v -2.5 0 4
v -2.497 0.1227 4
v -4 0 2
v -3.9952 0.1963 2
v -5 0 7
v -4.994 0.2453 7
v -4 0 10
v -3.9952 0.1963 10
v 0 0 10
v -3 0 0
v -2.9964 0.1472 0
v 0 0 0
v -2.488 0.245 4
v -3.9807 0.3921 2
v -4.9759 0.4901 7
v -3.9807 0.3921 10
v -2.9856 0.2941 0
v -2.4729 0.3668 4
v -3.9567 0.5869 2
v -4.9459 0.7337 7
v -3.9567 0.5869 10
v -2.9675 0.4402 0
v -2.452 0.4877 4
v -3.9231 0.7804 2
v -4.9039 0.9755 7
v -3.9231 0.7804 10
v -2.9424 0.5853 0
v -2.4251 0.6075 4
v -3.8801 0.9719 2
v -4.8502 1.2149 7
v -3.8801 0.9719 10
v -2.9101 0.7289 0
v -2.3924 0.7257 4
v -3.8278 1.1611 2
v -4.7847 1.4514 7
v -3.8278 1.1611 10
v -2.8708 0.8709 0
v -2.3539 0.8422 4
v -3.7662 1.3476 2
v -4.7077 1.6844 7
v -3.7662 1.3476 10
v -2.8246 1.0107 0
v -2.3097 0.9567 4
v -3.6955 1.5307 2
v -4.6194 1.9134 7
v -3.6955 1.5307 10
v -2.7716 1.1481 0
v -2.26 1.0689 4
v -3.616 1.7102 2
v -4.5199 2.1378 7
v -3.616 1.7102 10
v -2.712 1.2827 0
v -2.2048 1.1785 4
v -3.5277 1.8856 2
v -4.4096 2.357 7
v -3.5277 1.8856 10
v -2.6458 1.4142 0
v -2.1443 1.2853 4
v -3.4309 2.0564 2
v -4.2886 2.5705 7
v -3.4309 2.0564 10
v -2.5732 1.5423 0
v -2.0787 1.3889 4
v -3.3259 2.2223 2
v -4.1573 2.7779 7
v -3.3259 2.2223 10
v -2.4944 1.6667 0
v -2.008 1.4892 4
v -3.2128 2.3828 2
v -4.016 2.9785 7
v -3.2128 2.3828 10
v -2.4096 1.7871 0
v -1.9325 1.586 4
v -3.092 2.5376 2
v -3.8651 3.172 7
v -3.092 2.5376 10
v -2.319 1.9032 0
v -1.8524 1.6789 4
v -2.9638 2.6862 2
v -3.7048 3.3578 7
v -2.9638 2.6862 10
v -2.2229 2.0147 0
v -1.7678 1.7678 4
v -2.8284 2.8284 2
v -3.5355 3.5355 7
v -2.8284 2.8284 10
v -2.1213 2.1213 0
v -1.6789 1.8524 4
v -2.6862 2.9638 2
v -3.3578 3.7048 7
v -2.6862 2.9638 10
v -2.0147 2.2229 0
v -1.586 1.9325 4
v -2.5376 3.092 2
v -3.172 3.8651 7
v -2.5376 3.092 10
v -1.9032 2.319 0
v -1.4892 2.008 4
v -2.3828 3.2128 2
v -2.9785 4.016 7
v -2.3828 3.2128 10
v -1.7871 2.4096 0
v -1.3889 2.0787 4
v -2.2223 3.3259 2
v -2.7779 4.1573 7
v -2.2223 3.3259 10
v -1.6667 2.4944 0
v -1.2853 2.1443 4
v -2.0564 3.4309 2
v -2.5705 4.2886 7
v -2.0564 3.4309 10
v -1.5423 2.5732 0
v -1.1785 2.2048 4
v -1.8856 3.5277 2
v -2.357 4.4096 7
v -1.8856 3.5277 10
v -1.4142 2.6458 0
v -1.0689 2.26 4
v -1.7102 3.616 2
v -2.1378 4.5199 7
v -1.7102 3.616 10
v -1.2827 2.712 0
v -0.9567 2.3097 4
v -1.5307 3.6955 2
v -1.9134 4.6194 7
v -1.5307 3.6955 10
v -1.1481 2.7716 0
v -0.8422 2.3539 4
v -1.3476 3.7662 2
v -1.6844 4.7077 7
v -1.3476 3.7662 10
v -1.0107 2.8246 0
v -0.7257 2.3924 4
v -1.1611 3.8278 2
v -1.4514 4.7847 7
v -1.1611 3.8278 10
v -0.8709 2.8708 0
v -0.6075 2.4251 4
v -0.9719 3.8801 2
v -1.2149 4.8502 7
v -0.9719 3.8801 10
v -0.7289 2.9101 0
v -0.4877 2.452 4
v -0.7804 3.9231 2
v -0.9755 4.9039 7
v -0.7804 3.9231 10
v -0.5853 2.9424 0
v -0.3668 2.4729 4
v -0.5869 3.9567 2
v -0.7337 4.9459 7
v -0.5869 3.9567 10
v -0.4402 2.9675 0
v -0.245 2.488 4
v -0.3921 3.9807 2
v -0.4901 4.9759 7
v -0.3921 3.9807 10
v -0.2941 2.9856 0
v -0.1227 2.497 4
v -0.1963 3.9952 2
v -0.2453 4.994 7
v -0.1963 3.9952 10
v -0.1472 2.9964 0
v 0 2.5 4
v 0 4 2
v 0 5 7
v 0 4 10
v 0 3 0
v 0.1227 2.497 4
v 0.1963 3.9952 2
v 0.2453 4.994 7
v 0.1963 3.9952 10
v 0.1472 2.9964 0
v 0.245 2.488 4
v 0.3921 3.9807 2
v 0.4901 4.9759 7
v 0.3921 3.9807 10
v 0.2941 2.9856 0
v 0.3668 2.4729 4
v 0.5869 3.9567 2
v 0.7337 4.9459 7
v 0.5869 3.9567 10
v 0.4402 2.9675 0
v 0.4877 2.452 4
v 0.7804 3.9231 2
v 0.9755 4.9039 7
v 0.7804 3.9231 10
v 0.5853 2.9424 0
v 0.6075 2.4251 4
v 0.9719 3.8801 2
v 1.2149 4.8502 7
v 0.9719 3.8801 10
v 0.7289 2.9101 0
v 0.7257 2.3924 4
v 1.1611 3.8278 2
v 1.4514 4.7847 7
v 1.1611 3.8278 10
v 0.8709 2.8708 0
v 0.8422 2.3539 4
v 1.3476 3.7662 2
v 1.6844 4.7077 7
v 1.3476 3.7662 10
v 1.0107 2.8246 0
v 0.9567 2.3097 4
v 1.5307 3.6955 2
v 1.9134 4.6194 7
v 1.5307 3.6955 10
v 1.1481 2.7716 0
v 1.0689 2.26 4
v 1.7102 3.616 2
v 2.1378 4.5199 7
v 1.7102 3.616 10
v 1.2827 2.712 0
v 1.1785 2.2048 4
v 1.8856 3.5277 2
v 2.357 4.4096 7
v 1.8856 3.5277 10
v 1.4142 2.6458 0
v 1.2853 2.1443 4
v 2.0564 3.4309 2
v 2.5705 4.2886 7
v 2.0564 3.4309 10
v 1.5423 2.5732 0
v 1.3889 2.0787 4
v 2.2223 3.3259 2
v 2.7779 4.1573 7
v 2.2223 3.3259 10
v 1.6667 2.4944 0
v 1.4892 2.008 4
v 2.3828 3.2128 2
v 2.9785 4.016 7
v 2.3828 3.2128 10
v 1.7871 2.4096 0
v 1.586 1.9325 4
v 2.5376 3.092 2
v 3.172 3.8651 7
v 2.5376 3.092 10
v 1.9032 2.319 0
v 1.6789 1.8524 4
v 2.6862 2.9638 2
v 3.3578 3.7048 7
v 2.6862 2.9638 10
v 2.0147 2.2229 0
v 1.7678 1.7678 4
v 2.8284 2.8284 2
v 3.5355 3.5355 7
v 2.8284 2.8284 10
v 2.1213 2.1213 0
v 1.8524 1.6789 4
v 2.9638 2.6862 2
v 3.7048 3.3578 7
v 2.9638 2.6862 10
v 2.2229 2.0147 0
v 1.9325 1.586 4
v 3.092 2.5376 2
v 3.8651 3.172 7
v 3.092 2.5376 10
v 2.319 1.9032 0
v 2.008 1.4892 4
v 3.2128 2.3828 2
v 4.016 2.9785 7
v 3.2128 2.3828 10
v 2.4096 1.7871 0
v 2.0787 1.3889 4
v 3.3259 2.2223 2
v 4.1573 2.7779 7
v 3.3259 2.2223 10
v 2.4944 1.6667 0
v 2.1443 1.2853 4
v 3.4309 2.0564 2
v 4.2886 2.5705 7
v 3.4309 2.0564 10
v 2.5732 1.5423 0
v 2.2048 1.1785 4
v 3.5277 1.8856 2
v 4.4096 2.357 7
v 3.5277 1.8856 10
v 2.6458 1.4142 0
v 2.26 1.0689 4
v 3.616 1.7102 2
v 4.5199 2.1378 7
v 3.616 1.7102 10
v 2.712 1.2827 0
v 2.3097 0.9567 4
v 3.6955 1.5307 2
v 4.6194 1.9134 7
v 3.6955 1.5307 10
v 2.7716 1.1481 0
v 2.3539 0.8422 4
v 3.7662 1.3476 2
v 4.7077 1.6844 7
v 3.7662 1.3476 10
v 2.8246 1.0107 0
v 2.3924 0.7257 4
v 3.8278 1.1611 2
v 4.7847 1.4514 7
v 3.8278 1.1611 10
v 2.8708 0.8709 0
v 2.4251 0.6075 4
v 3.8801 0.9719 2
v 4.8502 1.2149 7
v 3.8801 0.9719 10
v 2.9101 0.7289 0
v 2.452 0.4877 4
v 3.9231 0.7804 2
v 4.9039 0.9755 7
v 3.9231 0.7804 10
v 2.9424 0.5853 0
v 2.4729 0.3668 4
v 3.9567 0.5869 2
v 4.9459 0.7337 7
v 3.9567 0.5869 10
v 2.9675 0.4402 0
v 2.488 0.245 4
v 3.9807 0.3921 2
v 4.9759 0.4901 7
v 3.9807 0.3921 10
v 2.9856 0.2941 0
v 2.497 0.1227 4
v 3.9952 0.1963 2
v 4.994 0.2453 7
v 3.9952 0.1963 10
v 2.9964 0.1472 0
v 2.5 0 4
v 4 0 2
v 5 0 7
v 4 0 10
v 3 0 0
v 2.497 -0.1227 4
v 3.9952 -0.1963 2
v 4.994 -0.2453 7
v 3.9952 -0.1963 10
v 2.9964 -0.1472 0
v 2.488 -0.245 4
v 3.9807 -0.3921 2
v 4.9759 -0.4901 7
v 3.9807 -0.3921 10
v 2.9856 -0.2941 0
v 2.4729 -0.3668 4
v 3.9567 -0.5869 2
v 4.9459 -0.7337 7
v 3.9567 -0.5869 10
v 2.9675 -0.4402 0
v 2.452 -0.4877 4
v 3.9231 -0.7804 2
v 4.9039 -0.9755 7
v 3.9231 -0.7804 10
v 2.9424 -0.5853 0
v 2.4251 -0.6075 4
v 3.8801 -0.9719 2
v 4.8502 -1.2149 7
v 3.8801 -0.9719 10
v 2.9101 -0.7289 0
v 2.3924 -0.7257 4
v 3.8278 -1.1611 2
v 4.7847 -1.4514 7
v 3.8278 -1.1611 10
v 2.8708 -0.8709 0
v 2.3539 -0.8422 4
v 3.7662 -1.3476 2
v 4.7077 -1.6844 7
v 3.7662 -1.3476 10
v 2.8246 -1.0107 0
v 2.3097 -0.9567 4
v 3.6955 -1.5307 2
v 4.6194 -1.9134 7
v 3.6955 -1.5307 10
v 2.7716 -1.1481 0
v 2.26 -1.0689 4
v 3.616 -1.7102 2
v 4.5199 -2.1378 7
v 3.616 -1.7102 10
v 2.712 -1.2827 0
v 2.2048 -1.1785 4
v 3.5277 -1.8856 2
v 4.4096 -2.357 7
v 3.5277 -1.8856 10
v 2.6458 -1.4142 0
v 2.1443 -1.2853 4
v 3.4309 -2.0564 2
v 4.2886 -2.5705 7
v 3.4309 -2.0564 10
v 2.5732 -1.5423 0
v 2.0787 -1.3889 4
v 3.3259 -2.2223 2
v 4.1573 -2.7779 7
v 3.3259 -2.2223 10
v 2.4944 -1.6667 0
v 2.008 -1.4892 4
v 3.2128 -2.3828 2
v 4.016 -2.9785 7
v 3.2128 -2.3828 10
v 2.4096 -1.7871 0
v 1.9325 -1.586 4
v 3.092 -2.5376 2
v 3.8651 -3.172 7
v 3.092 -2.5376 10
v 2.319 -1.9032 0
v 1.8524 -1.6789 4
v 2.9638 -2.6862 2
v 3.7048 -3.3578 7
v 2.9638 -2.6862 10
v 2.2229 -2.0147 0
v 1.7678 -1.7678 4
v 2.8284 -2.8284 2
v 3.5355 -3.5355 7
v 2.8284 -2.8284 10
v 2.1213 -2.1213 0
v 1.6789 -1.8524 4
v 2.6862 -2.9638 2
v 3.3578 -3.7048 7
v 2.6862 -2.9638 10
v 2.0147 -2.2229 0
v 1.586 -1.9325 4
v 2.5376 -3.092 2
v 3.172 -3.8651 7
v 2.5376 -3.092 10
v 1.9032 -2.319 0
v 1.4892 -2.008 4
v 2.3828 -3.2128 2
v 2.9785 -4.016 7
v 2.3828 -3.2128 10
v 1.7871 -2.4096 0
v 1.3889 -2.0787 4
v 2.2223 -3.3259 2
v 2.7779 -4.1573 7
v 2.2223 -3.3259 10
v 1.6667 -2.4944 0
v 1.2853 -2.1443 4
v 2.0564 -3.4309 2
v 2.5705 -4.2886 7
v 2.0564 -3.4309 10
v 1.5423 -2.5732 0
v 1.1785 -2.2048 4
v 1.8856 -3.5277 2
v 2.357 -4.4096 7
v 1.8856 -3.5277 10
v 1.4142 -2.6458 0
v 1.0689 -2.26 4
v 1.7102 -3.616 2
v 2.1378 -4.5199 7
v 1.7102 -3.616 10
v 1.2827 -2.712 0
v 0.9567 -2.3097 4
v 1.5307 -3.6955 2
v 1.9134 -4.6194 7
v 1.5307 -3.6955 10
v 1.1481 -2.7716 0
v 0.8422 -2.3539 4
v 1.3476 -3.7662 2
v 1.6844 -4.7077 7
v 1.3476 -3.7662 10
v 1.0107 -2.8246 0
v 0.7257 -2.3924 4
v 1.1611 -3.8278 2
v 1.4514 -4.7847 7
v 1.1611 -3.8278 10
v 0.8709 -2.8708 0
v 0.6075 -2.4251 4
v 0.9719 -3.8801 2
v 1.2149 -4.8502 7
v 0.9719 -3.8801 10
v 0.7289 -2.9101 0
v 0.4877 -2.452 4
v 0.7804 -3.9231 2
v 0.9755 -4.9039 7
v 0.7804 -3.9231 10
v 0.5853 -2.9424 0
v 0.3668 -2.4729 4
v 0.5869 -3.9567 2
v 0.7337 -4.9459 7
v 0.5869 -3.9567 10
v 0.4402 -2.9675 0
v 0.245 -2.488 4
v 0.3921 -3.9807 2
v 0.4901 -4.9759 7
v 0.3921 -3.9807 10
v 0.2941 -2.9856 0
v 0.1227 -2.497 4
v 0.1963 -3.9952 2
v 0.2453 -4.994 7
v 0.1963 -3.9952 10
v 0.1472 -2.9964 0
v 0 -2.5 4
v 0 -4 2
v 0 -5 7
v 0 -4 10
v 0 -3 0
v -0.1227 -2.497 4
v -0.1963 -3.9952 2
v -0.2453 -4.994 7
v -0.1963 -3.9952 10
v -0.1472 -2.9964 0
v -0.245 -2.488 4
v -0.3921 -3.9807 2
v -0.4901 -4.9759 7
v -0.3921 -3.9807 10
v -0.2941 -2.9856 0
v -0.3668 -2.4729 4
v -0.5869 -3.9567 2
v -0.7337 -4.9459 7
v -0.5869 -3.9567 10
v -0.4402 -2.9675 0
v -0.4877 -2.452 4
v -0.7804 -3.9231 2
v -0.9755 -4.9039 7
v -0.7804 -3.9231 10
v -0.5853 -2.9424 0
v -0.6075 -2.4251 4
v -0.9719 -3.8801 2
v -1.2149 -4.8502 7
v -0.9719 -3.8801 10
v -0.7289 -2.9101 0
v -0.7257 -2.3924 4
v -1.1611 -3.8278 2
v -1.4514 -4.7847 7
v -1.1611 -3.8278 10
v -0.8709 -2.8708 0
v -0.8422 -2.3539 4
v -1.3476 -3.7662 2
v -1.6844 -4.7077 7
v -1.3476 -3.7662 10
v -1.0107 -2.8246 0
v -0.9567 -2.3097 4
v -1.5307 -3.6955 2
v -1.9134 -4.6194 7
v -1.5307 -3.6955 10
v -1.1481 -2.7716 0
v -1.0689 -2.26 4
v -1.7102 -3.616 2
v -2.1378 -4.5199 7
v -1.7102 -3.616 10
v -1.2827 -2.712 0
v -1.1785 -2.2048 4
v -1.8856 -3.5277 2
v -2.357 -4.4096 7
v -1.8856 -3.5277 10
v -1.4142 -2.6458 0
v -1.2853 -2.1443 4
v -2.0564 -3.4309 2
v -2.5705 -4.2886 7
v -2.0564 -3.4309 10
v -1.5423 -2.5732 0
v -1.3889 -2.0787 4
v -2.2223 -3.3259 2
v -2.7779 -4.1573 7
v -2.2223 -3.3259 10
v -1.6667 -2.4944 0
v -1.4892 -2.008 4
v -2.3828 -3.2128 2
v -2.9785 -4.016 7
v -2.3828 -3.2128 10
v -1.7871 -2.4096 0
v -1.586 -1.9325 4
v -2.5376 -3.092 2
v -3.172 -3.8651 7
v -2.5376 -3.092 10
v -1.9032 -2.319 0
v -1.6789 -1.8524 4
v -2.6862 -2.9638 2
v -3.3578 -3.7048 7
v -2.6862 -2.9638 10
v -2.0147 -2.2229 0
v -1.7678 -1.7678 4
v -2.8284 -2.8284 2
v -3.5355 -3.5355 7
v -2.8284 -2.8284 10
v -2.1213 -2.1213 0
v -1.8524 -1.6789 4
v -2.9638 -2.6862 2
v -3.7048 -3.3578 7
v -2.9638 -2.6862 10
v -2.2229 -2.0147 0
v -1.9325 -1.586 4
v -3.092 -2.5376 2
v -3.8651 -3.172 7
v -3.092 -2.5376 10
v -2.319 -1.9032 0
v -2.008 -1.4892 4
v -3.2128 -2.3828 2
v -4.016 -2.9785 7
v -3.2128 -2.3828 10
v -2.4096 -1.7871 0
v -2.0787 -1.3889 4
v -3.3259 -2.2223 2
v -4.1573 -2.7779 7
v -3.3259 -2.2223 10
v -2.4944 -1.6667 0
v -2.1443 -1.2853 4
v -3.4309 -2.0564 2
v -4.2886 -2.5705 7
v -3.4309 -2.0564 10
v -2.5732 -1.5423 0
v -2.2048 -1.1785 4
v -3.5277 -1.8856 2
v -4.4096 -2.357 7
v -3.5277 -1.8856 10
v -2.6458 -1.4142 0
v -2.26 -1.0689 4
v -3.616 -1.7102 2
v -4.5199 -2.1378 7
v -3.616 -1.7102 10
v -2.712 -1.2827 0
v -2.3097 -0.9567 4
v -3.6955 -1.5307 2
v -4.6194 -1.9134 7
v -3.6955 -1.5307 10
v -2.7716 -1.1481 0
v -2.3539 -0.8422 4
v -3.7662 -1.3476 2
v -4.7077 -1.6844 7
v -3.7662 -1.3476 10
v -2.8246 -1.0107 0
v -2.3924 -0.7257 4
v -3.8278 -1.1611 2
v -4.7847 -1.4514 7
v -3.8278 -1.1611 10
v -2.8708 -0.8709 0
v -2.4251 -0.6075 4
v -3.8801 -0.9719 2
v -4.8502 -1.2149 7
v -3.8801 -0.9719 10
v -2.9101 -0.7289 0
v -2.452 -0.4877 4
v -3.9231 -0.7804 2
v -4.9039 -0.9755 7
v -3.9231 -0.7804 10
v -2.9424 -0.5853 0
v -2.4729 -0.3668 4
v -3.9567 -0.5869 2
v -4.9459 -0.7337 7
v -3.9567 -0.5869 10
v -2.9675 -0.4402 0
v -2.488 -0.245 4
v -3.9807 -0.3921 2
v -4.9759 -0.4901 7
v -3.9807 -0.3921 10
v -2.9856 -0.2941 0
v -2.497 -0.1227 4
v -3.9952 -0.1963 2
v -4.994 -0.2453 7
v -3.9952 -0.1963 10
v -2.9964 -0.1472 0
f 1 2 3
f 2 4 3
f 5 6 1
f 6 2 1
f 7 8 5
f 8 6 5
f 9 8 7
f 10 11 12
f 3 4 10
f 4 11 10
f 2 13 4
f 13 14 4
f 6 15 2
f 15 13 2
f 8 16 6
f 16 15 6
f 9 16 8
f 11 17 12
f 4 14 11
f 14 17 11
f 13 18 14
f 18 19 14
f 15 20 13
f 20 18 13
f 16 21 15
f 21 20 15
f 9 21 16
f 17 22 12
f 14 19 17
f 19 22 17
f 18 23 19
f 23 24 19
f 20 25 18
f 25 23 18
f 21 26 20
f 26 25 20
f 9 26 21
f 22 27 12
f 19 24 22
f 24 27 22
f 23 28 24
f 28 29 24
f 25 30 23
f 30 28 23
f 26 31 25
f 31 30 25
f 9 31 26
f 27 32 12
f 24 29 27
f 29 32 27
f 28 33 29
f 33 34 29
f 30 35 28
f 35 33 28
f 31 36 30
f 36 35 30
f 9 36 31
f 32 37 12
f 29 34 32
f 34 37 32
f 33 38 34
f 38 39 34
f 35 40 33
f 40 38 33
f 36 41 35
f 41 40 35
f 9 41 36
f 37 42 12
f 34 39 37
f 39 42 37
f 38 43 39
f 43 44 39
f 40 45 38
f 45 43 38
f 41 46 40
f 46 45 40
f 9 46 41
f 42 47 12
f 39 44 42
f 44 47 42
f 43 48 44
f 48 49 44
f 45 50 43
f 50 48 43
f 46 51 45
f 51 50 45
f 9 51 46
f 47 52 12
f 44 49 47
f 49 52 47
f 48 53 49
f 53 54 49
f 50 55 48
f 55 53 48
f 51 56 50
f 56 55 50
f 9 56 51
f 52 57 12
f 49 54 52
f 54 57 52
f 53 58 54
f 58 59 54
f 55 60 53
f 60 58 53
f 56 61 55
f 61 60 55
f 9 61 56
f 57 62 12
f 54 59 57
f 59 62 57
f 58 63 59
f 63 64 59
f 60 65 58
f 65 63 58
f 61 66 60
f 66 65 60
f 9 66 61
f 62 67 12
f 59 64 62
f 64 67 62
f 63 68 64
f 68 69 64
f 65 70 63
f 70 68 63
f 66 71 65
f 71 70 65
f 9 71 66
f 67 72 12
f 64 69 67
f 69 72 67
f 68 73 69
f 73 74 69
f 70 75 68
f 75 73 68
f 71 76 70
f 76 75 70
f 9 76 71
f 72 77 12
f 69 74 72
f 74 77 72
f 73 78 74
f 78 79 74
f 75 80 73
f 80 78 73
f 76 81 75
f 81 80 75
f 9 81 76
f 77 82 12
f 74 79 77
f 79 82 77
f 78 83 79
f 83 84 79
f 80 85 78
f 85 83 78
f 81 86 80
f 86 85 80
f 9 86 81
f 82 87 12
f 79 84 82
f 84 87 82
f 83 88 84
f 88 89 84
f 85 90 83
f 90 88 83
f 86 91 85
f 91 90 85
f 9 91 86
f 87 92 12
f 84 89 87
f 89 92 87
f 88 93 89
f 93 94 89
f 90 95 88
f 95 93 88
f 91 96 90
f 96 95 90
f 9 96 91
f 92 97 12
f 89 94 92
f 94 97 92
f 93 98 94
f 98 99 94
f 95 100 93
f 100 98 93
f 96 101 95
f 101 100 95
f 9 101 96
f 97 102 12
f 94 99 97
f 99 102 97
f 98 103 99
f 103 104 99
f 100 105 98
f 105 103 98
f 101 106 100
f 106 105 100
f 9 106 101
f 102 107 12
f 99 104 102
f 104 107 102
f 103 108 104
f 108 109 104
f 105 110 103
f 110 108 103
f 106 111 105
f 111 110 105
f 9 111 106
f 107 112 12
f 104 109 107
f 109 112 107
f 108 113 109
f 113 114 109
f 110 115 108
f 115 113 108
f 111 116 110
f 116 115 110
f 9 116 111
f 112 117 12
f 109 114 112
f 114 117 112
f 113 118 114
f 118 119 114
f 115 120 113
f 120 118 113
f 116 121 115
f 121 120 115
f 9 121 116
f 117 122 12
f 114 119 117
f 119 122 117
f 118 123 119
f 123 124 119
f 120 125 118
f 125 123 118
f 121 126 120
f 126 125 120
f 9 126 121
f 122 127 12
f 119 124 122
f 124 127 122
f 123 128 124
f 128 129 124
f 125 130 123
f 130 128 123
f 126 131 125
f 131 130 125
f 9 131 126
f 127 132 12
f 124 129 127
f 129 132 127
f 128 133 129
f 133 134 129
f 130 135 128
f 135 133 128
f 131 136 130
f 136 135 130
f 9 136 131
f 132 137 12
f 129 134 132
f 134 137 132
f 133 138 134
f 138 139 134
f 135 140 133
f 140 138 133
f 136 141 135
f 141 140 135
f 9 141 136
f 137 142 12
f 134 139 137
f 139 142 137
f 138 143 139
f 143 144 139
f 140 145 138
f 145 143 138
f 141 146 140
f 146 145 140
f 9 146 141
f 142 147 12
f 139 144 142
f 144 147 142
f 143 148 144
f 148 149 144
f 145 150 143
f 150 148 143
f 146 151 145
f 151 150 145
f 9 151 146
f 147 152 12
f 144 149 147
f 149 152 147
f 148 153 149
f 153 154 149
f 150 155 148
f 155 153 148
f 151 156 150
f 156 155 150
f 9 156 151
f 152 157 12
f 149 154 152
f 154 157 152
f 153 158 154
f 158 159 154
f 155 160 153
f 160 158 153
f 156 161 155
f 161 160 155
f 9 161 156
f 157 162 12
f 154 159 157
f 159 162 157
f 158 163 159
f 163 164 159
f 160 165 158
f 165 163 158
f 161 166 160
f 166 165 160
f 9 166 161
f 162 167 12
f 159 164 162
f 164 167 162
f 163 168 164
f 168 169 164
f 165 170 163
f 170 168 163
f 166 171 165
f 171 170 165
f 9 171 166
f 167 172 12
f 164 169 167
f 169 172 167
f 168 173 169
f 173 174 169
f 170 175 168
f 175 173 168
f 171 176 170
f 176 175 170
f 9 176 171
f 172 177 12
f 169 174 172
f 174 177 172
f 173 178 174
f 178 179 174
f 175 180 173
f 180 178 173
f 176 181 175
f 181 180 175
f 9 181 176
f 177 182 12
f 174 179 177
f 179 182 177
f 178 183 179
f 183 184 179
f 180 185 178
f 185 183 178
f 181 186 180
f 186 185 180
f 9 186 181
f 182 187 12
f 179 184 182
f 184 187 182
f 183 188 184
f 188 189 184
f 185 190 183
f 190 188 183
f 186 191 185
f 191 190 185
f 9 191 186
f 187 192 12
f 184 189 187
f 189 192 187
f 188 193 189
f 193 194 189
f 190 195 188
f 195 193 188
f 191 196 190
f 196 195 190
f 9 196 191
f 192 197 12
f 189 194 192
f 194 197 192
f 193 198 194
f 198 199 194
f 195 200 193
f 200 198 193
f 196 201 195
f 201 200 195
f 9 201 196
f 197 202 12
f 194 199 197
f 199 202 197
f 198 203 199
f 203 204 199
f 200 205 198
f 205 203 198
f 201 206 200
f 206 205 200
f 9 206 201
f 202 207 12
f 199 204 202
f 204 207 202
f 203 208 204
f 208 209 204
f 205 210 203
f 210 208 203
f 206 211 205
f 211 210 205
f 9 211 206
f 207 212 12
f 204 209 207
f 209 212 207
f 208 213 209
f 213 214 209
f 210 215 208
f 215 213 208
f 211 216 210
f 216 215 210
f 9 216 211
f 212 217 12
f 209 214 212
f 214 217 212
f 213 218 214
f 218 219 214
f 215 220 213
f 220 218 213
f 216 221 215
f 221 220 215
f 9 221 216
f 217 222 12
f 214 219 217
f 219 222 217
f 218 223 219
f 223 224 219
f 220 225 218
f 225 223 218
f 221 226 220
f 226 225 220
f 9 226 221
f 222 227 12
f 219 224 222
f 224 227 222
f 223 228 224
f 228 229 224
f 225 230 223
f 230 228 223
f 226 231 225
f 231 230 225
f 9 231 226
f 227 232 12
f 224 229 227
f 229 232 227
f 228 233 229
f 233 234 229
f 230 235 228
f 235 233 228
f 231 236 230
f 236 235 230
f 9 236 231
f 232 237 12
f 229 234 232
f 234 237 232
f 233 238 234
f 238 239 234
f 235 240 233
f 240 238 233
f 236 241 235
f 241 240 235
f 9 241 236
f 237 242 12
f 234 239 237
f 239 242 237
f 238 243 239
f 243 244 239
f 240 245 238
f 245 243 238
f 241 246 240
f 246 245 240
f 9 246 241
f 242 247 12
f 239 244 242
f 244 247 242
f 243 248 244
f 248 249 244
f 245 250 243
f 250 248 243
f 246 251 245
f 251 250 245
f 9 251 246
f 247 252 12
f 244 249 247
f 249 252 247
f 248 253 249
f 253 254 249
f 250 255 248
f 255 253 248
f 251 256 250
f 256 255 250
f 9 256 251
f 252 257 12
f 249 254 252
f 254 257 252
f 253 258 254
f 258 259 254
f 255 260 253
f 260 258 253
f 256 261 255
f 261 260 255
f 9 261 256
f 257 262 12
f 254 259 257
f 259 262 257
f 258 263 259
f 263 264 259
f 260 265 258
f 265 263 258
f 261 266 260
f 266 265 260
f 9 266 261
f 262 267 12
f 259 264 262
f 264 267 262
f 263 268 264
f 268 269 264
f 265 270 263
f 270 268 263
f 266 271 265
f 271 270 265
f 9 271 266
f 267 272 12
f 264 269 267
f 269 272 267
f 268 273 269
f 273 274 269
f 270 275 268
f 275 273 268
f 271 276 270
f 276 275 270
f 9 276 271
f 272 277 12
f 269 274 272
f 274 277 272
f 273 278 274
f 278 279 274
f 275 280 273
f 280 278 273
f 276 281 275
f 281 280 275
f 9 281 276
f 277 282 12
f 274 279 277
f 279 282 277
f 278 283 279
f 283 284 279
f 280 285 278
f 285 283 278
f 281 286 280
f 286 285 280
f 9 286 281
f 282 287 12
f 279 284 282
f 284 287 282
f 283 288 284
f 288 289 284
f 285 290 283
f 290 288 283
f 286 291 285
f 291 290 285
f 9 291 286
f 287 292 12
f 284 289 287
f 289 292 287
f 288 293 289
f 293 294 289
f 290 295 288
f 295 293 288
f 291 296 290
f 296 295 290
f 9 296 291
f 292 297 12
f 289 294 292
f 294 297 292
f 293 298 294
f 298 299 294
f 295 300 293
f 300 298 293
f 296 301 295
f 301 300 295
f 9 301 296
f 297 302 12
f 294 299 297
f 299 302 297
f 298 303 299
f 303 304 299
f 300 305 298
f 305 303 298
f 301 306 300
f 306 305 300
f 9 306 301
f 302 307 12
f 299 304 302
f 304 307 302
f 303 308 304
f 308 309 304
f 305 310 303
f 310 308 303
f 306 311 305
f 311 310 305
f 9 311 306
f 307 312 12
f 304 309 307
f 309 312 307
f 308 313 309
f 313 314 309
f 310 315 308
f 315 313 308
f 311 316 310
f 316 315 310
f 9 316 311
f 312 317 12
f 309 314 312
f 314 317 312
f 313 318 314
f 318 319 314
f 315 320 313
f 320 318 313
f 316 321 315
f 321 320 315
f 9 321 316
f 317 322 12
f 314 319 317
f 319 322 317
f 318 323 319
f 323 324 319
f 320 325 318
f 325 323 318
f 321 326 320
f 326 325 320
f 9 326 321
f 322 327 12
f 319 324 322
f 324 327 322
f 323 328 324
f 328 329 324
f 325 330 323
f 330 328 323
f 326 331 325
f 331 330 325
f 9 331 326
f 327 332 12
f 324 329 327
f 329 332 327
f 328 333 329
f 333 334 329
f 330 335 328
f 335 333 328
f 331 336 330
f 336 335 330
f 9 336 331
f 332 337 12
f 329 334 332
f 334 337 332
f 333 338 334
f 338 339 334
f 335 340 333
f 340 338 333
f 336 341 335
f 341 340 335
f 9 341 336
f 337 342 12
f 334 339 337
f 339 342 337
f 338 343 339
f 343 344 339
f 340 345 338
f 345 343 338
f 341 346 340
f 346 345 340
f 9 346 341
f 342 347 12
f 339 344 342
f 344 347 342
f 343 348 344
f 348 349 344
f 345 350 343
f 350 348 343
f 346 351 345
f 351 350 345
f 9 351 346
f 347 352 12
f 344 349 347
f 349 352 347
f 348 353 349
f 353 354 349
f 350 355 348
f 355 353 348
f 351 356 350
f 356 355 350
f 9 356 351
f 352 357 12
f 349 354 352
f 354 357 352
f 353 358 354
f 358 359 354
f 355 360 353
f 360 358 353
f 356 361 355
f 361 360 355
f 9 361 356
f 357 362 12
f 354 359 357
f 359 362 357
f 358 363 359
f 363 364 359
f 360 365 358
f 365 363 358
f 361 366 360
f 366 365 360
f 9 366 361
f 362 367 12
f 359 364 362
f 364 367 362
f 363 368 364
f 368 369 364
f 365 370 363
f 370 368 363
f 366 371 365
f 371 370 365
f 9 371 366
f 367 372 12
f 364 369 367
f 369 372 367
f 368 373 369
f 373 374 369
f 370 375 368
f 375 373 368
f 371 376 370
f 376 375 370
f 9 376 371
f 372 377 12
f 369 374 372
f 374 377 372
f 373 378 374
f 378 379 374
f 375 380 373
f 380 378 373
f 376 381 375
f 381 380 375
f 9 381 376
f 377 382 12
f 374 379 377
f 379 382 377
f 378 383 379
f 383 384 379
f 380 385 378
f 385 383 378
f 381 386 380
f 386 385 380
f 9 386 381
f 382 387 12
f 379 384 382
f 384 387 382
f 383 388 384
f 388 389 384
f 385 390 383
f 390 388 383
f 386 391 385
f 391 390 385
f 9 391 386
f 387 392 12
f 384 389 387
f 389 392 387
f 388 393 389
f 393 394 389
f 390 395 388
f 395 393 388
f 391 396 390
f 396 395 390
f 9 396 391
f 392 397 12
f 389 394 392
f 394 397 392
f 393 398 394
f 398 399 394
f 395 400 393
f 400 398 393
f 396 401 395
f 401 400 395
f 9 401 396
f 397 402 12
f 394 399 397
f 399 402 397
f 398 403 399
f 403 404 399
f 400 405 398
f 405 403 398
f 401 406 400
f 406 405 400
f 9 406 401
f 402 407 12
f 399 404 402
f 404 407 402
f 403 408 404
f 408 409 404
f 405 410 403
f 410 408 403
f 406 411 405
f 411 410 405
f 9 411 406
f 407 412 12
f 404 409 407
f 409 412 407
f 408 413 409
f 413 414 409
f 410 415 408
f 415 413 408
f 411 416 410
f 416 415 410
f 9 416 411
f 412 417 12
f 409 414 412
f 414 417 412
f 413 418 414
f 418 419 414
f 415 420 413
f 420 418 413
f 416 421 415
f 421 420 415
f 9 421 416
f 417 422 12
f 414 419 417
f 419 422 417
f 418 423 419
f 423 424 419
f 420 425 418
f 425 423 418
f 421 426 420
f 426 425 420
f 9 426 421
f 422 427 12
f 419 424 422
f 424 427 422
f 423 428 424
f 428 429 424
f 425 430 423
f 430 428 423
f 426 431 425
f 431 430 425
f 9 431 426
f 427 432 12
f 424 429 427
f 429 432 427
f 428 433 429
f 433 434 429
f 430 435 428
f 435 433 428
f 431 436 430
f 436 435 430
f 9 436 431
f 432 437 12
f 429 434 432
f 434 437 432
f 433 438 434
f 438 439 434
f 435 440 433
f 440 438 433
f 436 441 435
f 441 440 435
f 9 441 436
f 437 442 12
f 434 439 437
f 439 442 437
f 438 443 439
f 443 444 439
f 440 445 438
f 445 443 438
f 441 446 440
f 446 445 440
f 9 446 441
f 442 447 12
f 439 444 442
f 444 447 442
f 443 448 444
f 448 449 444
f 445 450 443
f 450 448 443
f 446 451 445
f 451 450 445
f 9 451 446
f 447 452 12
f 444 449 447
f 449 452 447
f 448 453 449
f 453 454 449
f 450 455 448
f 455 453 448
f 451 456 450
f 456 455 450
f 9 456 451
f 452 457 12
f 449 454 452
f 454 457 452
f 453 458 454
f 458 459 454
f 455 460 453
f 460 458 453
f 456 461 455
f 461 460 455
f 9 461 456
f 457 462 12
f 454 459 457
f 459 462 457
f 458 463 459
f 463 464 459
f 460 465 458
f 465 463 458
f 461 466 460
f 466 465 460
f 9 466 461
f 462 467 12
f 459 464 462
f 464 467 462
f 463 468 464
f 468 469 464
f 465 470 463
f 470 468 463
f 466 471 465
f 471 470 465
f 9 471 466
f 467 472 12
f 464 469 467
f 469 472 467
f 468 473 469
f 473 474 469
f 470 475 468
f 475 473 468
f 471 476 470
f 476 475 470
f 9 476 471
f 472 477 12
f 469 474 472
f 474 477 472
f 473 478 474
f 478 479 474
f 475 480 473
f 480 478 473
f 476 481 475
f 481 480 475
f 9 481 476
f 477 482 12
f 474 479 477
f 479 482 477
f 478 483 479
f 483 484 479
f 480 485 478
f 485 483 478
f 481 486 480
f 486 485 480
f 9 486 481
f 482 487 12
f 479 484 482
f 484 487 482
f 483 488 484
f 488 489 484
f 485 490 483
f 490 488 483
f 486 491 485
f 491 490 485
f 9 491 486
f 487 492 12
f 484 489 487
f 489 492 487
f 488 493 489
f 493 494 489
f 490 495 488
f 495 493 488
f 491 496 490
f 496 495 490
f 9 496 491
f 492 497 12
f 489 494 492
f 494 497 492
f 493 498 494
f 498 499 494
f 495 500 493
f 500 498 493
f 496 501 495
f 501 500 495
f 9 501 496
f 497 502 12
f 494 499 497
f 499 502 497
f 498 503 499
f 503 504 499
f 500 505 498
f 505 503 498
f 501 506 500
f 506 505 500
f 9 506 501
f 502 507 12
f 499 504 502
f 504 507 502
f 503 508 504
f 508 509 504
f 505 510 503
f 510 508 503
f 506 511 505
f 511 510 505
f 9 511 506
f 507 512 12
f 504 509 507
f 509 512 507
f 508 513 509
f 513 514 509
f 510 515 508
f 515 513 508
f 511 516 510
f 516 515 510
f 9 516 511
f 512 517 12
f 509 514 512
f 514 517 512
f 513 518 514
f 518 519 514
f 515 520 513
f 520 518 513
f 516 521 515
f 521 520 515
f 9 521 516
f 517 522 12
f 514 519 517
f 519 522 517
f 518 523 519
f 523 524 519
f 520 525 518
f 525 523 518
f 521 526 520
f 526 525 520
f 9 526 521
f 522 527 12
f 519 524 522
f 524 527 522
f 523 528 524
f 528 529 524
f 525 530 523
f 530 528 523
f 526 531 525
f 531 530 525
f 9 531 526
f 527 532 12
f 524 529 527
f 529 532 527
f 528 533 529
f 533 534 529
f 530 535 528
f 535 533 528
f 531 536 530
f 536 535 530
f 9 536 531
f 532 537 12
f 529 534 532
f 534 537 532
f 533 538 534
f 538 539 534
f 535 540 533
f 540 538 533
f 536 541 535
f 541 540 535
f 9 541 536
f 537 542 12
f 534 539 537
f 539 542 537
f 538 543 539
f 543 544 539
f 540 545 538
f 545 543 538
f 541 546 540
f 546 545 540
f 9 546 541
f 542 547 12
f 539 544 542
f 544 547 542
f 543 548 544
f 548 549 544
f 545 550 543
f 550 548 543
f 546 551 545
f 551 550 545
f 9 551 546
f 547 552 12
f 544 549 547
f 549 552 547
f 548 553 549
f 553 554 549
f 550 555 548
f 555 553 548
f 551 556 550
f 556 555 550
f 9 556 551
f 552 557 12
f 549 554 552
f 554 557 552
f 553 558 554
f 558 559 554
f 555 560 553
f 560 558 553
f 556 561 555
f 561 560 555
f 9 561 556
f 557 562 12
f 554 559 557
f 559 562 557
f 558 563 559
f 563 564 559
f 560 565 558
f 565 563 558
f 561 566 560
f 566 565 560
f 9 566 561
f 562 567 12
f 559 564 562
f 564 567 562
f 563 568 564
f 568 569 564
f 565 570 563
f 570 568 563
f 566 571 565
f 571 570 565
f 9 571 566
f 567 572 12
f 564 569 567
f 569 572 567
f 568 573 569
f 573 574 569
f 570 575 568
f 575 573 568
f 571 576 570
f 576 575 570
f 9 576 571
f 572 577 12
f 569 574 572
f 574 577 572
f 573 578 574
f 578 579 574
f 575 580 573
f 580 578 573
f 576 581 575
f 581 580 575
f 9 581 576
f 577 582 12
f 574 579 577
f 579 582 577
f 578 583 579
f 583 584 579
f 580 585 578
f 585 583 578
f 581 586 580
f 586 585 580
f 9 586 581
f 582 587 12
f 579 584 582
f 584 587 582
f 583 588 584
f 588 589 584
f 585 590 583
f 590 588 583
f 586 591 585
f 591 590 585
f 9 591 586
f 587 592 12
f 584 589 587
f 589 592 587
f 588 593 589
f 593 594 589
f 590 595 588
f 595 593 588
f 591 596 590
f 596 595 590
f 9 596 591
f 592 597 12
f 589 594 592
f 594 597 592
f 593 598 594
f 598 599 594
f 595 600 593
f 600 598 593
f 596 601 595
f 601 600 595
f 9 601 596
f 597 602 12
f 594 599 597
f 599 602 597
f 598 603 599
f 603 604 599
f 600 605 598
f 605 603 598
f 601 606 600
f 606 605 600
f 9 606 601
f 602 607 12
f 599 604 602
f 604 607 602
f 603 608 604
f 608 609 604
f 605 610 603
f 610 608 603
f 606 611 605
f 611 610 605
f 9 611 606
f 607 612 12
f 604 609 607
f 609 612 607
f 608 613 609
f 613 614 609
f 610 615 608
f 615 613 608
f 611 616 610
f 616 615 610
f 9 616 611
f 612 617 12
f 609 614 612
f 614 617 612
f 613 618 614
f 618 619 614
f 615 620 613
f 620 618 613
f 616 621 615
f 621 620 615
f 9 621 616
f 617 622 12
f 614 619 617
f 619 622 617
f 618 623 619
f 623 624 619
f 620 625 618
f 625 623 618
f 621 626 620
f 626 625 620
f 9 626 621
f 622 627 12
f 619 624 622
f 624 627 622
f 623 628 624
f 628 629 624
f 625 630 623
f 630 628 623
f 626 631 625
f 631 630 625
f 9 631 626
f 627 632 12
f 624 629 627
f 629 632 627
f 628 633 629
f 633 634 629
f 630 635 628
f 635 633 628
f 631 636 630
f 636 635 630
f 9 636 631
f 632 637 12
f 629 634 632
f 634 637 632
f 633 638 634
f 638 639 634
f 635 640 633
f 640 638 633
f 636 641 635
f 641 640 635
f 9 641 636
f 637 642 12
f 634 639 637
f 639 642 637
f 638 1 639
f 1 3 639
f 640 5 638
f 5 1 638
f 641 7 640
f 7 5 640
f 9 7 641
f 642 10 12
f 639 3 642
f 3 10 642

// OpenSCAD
// Auto-generated from tests/data/feature_fixtures_manifest.json
// fixture: revolve_vase
// fixture_type: revolve
// description: Vase-like radius profile for generic polygon revolve recovery.
$fn = 96;

profile = [
    [0.000000, 0.000000],
    [3.000000, 0.000000],
    [4.000000, 2.000000],
    [2.500000, 4.000000],
    [5.000000, 7.000000],
    [4.000000, 10.000000],
    [0.000000, 10.000000]
];

rotate_extrude($fn=128) polygon(points=profile);
